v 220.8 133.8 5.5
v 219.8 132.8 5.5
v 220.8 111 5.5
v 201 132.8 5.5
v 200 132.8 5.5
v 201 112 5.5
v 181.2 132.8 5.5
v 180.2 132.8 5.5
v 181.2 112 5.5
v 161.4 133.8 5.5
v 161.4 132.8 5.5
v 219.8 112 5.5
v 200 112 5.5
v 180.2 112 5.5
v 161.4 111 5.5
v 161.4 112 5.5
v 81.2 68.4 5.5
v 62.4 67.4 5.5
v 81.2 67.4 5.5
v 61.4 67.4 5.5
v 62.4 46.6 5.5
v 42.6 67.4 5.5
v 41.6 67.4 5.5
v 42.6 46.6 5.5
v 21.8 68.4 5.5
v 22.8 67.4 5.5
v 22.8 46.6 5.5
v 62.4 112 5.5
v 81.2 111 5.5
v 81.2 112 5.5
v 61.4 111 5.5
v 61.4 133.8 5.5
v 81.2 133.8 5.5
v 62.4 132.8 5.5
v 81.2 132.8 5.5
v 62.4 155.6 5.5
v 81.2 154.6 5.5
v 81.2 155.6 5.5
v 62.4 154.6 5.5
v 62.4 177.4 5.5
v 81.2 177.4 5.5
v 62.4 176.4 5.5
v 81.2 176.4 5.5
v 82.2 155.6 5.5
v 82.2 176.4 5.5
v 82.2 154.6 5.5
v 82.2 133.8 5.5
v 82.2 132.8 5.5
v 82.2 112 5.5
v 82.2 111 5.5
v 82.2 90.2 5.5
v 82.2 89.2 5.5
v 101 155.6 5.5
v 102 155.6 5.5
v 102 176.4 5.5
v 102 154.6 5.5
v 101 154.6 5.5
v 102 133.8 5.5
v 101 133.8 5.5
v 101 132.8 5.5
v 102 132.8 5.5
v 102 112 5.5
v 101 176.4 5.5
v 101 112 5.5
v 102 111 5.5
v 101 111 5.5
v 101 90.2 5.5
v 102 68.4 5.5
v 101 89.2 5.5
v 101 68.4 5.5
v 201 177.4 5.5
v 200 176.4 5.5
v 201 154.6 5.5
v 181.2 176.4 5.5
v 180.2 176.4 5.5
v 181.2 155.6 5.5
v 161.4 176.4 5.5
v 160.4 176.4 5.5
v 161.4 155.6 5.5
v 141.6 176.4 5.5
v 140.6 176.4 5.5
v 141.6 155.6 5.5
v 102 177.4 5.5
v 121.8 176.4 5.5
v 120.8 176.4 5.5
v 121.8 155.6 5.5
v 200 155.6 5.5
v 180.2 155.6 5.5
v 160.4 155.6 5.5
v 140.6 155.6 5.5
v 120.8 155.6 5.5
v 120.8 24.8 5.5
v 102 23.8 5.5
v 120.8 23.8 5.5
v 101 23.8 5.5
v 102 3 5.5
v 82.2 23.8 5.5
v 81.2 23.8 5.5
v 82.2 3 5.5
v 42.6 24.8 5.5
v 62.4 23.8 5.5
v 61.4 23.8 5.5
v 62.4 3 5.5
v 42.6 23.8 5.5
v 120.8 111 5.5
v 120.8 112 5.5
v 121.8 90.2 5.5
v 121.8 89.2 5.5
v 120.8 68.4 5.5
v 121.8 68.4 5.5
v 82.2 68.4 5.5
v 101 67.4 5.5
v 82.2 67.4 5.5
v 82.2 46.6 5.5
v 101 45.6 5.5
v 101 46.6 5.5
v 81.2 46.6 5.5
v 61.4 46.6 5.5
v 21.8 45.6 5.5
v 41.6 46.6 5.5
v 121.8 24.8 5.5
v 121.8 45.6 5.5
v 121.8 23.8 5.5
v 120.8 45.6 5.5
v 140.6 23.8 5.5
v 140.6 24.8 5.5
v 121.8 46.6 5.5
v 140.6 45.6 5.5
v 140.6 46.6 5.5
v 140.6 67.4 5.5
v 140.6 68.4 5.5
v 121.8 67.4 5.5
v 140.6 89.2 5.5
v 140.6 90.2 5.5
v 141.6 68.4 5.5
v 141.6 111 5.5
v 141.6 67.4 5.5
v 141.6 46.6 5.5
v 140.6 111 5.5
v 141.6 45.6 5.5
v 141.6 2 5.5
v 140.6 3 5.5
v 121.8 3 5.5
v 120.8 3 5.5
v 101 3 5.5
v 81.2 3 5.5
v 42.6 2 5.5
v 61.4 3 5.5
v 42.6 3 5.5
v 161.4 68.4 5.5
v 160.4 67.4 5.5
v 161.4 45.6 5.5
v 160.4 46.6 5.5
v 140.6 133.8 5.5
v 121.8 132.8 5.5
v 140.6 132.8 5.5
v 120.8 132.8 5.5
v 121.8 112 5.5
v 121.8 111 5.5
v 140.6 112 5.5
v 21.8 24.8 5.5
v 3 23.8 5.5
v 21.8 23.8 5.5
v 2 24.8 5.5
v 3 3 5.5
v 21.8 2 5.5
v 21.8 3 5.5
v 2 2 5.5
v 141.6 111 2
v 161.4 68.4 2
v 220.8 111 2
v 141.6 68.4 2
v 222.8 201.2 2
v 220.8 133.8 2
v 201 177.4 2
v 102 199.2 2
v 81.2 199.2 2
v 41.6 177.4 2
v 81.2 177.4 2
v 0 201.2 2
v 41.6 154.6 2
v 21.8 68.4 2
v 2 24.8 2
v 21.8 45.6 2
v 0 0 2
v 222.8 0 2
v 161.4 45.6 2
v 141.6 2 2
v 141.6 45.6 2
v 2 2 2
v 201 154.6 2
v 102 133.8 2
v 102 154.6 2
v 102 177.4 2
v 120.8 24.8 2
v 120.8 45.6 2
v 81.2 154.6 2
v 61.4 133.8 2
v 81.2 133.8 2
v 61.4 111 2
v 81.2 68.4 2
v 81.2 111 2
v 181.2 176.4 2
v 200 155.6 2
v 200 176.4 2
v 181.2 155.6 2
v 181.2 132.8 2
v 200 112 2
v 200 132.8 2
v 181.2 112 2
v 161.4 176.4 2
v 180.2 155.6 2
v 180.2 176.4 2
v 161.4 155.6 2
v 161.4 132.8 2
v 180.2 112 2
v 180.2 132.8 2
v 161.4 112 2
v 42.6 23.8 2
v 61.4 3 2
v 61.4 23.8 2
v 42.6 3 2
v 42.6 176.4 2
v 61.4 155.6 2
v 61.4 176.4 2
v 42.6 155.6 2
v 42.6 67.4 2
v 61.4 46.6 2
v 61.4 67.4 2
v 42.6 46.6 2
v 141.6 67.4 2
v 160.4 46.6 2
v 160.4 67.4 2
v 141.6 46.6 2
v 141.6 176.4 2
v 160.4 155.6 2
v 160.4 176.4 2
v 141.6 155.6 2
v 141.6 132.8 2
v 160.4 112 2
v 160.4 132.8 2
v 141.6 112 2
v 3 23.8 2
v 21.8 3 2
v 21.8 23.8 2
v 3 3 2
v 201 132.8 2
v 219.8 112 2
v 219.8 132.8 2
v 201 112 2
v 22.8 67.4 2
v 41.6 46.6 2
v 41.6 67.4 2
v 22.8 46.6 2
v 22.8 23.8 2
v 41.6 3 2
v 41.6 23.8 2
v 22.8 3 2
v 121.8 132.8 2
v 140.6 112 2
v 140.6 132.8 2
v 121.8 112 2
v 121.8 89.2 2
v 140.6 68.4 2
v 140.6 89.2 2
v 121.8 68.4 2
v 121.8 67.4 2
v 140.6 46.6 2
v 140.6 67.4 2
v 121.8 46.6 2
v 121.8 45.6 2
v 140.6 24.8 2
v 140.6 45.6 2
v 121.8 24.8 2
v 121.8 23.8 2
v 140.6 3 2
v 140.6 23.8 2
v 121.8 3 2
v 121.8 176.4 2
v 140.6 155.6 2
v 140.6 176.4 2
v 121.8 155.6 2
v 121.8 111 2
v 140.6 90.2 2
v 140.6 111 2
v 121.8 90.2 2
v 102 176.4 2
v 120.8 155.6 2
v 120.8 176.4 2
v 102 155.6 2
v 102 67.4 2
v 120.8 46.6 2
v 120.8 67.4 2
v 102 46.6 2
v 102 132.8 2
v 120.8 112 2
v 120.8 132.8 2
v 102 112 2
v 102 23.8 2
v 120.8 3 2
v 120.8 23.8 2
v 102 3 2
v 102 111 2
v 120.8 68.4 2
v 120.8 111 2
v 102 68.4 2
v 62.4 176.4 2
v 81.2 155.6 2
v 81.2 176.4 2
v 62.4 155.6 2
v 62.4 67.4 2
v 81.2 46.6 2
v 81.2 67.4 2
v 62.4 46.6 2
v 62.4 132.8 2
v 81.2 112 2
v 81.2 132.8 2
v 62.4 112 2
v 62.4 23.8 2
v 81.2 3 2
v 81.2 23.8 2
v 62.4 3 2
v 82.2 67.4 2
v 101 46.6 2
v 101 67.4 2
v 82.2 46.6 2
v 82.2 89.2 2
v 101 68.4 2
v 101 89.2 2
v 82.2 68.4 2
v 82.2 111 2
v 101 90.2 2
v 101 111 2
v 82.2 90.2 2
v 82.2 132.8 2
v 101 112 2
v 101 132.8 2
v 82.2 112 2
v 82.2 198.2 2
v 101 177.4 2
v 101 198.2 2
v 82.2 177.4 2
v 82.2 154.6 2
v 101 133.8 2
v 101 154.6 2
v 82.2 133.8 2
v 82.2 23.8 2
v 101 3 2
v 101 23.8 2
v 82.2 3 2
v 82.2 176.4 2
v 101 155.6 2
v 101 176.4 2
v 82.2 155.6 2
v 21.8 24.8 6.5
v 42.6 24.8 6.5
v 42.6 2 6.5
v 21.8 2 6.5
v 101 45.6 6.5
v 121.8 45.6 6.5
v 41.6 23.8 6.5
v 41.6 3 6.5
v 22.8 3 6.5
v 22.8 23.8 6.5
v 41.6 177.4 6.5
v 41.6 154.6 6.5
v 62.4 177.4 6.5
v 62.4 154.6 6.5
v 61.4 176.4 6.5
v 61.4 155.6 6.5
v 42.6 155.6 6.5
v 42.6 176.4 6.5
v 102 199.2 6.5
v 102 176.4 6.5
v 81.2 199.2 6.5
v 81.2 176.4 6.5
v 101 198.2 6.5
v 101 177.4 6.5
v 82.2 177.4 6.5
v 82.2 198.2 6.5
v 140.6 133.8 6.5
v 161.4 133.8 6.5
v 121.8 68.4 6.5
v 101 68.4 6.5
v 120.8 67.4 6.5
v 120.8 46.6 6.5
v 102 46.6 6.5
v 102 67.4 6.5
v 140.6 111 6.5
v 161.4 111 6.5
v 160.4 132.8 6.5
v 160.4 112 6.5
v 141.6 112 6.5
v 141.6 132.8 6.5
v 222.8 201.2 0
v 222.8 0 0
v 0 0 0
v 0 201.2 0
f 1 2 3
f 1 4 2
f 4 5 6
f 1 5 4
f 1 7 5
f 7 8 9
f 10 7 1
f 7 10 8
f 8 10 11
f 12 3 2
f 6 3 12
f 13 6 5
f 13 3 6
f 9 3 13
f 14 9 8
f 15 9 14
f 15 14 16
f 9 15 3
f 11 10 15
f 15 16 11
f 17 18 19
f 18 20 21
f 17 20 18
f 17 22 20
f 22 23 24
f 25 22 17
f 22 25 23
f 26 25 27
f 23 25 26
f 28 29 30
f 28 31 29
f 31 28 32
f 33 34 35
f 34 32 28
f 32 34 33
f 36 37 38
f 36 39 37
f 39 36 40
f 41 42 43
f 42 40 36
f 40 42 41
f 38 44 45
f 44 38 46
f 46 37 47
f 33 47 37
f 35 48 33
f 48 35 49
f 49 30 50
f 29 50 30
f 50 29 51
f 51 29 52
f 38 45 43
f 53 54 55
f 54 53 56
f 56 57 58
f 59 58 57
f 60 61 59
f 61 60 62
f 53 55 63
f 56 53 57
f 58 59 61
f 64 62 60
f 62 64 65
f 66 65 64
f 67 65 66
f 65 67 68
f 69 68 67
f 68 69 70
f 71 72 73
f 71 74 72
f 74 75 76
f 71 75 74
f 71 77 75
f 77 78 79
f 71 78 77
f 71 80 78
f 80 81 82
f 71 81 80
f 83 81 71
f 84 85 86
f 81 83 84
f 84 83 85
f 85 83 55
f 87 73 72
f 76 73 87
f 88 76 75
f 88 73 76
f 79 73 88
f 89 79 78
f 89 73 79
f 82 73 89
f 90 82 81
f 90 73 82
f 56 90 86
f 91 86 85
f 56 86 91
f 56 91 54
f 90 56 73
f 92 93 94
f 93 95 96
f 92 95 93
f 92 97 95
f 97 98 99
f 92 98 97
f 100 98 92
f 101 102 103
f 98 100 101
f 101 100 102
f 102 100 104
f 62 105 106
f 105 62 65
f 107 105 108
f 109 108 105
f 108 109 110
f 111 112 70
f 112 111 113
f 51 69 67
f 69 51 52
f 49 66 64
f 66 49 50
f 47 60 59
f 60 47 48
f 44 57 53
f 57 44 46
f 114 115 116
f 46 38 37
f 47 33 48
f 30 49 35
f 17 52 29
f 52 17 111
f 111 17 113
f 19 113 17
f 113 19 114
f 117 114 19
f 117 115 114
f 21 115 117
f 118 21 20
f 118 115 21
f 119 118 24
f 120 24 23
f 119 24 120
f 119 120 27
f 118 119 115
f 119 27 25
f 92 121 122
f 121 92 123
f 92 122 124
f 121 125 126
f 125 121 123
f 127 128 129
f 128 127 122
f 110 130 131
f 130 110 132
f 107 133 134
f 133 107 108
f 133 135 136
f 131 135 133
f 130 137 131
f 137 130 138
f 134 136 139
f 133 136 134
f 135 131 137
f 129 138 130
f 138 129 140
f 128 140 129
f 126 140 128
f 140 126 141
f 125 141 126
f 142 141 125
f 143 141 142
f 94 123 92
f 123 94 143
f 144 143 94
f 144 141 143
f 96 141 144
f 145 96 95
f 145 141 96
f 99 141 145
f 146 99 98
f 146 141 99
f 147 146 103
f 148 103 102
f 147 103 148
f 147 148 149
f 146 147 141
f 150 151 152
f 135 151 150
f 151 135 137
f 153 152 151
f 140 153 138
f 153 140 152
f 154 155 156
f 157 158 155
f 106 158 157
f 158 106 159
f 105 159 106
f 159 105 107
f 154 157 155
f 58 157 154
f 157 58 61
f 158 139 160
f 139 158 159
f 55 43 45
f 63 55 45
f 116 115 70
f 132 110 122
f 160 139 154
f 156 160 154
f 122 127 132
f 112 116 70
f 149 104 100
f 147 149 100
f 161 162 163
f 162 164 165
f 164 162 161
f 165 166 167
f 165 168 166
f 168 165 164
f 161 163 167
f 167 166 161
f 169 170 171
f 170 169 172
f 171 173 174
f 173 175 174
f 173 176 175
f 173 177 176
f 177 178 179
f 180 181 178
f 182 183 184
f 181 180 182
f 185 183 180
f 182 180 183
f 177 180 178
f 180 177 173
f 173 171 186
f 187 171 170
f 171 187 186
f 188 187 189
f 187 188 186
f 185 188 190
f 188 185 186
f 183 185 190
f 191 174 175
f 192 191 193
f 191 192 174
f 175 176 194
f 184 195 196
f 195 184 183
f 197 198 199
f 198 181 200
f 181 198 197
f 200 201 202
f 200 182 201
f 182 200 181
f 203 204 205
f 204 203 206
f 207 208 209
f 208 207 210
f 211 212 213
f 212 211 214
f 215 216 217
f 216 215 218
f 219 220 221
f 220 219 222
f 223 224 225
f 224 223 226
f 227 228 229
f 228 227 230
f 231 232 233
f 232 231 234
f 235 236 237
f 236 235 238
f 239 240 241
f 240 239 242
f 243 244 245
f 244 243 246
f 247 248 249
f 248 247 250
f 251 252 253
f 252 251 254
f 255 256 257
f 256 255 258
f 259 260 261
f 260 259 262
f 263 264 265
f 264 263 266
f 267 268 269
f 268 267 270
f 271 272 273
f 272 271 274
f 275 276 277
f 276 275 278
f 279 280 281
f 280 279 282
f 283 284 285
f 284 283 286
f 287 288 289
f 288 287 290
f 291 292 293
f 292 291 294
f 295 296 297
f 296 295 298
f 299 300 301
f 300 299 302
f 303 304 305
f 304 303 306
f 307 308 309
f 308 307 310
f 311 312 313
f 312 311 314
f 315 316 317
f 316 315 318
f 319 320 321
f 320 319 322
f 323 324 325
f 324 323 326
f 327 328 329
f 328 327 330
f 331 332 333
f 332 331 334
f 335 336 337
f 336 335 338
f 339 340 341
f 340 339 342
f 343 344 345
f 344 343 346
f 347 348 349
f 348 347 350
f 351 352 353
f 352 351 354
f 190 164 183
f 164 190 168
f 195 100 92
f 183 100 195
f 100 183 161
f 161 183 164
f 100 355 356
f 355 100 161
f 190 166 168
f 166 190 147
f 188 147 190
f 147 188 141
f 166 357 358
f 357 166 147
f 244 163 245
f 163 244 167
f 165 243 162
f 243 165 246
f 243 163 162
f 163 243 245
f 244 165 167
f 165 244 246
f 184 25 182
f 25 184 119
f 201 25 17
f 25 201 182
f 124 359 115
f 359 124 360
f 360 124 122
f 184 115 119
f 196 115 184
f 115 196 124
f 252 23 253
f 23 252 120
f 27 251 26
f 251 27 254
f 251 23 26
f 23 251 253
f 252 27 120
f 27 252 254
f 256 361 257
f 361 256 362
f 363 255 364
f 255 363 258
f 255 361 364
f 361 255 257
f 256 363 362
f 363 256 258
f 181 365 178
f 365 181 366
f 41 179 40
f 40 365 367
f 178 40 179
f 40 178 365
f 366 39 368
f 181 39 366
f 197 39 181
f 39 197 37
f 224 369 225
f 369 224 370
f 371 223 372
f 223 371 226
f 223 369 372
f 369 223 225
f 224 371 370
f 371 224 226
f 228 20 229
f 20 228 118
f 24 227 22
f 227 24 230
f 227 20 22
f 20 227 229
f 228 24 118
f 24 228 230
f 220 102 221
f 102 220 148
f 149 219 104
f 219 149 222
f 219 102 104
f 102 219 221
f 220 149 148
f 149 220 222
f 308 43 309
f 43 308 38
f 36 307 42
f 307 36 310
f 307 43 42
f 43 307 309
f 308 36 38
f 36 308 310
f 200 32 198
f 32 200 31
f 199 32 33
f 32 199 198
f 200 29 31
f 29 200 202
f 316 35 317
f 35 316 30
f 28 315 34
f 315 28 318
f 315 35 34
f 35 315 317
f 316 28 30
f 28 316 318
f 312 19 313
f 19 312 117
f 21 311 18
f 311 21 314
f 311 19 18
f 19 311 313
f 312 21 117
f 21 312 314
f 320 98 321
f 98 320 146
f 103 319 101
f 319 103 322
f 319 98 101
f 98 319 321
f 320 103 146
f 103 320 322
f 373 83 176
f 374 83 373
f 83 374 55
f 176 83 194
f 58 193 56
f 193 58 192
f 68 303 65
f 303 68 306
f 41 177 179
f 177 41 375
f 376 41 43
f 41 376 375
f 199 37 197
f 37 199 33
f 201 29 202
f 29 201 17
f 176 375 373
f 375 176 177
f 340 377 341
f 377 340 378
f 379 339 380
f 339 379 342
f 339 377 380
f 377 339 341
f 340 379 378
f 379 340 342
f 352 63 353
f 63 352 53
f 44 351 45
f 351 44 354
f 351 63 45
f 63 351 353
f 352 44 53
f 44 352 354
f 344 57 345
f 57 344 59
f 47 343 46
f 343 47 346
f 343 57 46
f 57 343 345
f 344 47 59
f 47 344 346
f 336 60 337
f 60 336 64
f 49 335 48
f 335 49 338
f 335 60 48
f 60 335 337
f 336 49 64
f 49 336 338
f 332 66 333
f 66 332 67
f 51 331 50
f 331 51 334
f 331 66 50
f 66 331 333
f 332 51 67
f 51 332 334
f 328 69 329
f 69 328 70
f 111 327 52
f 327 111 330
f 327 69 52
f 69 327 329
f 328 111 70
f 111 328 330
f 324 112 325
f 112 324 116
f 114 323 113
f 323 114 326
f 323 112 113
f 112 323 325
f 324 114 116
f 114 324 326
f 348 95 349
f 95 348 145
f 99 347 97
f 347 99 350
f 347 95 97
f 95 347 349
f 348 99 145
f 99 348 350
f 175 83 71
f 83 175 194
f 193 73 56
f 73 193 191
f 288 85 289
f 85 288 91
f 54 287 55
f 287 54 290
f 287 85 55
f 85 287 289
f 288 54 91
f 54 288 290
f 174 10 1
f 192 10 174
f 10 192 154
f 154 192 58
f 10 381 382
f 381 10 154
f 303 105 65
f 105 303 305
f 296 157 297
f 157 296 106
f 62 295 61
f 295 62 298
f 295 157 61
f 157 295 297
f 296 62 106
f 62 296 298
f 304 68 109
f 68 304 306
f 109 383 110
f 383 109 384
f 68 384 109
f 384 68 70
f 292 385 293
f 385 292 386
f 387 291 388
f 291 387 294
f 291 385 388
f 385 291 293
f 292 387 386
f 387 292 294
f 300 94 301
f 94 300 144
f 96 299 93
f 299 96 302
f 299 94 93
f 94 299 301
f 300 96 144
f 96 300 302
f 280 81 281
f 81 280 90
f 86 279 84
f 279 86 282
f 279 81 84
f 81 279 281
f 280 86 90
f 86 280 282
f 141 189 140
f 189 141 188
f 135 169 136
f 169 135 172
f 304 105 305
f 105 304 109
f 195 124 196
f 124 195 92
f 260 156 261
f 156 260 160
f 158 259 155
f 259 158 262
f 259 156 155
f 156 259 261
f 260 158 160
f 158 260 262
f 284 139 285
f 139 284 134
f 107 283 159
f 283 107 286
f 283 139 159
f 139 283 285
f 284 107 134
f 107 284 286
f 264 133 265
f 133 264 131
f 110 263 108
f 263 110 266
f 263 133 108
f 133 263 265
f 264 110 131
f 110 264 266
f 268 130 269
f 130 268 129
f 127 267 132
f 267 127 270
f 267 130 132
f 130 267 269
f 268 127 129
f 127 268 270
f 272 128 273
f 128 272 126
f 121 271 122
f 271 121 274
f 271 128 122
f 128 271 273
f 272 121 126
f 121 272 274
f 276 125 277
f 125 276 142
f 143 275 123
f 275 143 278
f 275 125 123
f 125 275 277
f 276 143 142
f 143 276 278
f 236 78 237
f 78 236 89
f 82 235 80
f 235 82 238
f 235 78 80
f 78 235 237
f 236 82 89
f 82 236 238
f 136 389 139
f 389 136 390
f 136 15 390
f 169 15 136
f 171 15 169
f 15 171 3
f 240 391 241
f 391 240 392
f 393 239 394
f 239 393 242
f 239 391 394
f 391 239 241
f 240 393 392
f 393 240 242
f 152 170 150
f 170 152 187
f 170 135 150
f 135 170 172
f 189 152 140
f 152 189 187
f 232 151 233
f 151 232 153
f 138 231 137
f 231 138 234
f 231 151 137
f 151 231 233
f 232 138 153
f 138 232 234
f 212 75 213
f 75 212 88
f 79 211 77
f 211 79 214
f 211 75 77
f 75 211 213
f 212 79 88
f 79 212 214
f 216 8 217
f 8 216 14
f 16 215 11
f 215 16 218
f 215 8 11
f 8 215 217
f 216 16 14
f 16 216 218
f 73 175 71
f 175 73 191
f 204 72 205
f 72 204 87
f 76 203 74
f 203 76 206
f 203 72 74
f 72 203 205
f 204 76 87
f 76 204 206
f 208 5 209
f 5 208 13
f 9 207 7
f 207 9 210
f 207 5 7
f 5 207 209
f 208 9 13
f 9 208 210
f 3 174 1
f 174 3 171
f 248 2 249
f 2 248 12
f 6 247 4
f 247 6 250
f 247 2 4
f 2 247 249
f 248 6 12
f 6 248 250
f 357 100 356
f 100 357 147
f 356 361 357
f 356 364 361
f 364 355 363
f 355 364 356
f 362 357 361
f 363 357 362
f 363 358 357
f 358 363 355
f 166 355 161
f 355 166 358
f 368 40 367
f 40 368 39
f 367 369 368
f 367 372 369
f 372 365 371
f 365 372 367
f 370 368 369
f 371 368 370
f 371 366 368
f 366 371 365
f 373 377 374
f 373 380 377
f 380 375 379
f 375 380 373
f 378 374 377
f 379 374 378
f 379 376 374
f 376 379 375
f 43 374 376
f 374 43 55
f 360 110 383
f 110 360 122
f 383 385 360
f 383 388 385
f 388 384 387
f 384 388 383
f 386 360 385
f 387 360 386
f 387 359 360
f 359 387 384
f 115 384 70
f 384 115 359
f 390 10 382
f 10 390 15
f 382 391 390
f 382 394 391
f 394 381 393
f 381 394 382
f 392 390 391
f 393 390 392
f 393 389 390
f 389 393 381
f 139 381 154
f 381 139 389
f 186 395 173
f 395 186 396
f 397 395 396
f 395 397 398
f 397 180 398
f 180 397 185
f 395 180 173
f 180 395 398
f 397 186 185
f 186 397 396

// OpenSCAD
selection = 0; // 0 = all, 1 = base, 2 = cells, 3 = marks
single_cell_test = false; // if true, just display a single cell with all the trimmings

show_base  = selection == 0 || selection == 1;
show_cells = selection == 0 || selection == 2;
show_marks = selection == 0 || selection == 3;

// design
data = single_cell_test ? [[0,1,2]] : [[0,0,0,0,2,0,0,0,0,0,0], [0,0,2,1,1,1,1,1,1,1,0], [0,0,0,0,1,0,0,0,0,0,0], [0,0,0,1,1,1,1,2,1,1,1], [0,0,0,0,1,0,1,0,0,0,0], [0,0,0,0,1,0,1,0,0,0,0], [0,1,1,1,1,2,1,1,0,0,0], [0,0,0,0,0,0,1,0,0,0,0], [1,2,1,1,1,1,1,0,0,0,0]];
characters_wide = single_cell_test ? 3 : 11;
characters_deep = single_cell_test ? 1 : 9;

tile_width=17.8;
tile_depth=19.8;

base_height=2;
cell_height=3.5; // 2.5 wood, +1 for the thingy
mark_height = 1;
echo(str("Base: 0.0 - ", base_height));
echo(str("Cell: ", base_height, " - ", base_height + cell_height));
echo(str("Mark: ", base_height + cell_height, " - ", base_height + cell_height + mark_height));

cell_margin=0.5;
cell_border=1;

base_padding=2;

base_width = (base_padding*2) + ((cell_border + (cell_margin*2) + tile_width) * characters_wide) + cell_border;
base_depth = (base_padding*2) + ((cell_border + (cell_margin*2) + tile_depth) * characters_deep) + cell_border;

echo("Max dimensions: 231 x 236");
echo(str("Width: ", base_width));
echo(str("Depth: ", base_depth));

// render base
if (show_base) {
    cube([base_width, base_depth, base_height]);
}

// render cells
if (show_cells) {
    for (x = [0 : characters_wide-1]) {
        for (y = [0 : characters_deep-1]) {
            y_from_top=characters_deep-1-y;
            if (data[y][x] == 1 || data[y][x] == 2) cell(x,y_from_top,false);
        }
    }
}

// render marks
if (show_marks) {
    for (x = [0 : characters_wide-1]) {
        for (y = [0 : characters_deep-1]) {
            y_from_top=characters_deep-1-y;
            if (data[y][x] == 2) cell(x,y_from_top,true);
        }
    }
}

module cell(x,y,mark) {
    translate([base_padding, base_padding, base_height])
        translate([
            (cell_border+(cell_margin*2)+tile_width) * x,
            (cell_border+(cell_margin*2)+tile_depth) * y, 
            mark ? cell_height : 0])
            render() {
                difference() {
                    cube([
                        cell_border+cell_margin+tile_width+cell_margin+cell_border,
                        cell_border+cell_margin+tile_depth+cell_margin+cell_border,
                        mark ? mark_height : cell_height]);
                    translate([cell_border, cell_border, -0.5])
                        cube([
                            cell_margin+tile_width+cell_margin,
                            cell_margin+tile_depth+cell_margin,
                            (mark ? mark_height : cell_height) + 1]);
                }
            }
}

module mark(x,y,mark) {
    translate([base_padding, base_padding, base_height])
        translate([
            (cell_border+(cell_margin*2)+tile_width) * x,
            (cell_border+(cell_margin*2)+tile_depth) * y, 0])
            render() {
                difference() {
                    cube([
                        cell_border+cell_margin+tile_width+cell_margin+cell_border,
                        cell_border+cell_margin+tile_depth+cell_margin+cell_border,
                        cell_height]);
                    translate([cell_border, cell_border, -0.5])
                        cube([
                            cell_margin+tile_width+cell_margin,
                            cell_margin+tile_depth+cell_margin,
                            cell_height+1]);
                }
            }
}
